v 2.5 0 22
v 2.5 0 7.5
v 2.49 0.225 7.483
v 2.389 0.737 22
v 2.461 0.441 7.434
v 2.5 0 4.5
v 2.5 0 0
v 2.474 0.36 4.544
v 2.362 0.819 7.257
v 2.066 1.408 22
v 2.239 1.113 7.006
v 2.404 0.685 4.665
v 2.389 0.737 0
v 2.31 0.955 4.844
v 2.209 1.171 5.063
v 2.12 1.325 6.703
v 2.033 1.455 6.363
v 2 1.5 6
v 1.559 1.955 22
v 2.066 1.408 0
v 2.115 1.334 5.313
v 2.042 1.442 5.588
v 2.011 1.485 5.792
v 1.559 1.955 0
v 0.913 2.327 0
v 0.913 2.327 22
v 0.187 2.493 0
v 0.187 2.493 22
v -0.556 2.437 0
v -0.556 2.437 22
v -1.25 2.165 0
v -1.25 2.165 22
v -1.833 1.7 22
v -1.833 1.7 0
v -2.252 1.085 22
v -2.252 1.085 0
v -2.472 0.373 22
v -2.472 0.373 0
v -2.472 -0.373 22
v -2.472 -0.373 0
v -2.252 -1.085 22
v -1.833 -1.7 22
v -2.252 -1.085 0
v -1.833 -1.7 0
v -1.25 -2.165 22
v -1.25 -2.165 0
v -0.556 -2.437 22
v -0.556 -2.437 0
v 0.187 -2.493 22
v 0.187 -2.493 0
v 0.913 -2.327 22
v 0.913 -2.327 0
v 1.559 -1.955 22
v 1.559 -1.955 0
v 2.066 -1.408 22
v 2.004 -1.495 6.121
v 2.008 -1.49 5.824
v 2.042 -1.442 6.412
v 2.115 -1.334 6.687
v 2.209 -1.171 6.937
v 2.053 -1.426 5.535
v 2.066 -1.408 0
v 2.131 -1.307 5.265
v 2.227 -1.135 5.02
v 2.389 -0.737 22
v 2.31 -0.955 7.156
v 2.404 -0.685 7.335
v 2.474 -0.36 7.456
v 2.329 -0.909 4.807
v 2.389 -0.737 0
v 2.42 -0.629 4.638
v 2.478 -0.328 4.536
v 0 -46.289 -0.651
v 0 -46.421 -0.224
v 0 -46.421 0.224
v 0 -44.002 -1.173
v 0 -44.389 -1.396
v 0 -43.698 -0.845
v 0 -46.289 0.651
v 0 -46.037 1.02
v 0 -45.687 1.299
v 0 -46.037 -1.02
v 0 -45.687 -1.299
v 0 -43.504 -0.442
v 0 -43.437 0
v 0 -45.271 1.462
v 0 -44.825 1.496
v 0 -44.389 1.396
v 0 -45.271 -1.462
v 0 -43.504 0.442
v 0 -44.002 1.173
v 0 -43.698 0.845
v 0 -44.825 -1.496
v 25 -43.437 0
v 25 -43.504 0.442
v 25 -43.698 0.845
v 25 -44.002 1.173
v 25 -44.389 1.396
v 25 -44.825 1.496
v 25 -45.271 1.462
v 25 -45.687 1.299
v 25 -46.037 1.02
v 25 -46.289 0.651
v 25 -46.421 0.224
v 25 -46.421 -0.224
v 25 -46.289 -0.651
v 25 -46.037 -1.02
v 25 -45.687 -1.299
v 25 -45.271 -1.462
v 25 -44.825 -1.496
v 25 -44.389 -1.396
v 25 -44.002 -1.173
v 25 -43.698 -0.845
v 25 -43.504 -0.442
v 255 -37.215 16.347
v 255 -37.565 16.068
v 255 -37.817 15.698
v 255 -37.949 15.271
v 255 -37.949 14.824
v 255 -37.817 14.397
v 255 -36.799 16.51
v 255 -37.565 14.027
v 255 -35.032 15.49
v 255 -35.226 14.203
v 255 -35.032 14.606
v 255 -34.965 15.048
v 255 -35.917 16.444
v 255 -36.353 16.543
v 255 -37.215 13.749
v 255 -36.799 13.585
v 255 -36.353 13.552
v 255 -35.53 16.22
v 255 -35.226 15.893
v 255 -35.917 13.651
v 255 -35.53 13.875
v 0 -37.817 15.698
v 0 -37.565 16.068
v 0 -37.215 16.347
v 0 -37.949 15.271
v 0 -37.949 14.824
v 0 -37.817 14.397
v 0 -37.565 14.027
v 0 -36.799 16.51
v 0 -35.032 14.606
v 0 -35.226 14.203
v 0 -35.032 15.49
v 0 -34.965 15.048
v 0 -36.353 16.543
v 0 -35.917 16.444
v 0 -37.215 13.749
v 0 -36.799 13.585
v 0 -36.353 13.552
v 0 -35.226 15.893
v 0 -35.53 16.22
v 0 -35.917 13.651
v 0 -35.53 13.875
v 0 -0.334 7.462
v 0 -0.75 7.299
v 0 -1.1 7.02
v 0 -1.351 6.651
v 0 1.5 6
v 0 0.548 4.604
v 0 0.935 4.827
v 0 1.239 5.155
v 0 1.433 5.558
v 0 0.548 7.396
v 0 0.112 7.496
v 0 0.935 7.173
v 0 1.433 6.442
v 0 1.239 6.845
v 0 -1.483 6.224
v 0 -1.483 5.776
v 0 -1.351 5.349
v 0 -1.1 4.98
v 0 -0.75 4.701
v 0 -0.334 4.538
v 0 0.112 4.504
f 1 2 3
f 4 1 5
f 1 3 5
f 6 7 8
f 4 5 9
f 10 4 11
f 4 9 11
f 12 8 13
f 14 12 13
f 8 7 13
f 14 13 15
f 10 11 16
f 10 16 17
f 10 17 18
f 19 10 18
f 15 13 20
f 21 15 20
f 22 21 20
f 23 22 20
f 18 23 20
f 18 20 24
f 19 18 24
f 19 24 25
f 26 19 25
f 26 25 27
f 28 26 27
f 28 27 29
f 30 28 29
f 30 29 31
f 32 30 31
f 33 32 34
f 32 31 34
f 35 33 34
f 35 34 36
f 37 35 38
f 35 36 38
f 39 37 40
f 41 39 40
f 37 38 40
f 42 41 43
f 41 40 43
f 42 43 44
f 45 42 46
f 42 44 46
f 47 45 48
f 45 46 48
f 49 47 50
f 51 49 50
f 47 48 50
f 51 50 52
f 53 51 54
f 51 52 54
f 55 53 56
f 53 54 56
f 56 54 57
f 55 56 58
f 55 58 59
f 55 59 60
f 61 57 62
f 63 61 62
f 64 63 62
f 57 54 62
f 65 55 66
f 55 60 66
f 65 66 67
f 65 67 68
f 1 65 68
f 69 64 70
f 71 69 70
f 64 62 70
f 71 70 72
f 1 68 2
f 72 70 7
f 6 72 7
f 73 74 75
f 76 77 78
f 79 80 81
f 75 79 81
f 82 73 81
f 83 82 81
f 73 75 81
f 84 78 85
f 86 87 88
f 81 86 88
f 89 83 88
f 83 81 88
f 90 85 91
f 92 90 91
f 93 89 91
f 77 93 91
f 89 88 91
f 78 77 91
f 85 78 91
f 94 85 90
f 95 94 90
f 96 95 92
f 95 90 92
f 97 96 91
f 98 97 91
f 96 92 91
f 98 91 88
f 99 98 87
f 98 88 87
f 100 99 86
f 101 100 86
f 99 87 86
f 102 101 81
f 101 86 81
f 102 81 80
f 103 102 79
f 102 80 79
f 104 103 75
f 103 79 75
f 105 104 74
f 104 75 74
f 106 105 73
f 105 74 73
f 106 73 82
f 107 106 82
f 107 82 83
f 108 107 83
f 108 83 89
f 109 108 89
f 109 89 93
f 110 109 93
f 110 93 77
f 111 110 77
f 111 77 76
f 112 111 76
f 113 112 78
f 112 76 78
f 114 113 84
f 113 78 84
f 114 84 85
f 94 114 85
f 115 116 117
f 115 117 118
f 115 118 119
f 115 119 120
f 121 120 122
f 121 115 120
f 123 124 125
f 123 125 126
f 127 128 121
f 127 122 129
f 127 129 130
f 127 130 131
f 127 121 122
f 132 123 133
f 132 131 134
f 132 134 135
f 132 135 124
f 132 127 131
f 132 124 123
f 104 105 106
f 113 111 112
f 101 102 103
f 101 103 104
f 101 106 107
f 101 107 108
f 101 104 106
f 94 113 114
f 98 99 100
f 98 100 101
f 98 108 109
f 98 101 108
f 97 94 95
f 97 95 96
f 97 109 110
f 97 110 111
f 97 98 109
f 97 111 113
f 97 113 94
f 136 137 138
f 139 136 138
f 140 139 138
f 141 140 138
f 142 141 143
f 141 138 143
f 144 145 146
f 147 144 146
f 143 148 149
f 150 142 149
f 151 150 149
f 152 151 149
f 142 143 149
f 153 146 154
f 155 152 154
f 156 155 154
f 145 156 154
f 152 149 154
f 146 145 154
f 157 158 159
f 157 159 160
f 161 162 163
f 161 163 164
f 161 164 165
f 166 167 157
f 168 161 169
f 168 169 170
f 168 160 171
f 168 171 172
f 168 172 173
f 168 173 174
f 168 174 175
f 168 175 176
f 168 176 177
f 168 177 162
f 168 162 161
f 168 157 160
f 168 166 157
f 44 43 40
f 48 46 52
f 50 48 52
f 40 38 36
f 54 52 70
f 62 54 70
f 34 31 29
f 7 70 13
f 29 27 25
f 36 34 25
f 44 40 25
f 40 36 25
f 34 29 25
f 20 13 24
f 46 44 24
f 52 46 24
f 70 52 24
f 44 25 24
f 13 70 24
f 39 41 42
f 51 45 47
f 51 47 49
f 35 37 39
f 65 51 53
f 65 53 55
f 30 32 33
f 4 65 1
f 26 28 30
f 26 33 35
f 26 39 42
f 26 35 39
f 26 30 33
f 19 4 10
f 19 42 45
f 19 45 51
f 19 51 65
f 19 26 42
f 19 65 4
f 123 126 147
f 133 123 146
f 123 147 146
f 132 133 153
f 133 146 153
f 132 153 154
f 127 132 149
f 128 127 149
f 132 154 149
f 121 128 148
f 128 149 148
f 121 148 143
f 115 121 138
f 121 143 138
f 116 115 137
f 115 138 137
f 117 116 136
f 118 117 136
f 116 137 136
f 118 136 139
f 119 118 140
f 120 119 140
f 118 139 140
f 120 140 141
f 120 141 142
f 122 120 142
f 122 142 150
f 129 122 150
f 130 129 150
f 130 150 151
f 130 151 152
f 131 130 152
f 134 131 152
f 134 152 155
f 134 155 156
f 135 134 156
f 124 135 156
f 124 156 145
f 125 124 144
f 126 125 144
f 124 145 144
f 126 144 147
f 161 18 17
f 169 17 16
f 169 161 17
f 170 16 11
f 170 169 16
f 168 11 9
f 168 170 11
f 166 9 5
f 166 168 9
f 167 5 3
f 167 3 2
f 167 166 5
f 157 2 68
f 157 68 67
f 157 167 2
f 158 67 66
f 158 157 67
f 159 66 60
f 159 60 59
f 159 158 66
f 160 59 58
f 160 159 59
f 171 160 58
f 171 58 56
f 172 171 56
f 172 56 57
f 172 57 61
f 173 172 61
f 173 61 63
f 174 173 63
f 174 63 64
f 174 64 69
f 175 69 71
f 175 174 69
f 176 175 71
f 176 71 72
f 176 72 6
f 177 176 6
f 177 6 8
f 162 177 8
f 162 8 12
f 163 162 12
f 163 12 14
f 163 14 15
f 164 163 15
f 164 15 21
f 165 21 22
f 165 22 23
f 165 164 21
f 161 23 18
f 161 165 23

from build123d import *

# Parameters (mm, degrees)
F0_R     = 2.5
F1_DEPTH = 22
F2_R     = 1.5
F3_DEPTH = 25
F4_R     = 1.5
F5_DEPTH = 255
F6_R     = 1.5
F7_DEPTH = 25


with BuildPart() as f1:
    # F0 (on Top) → F1 (new body)
    with BuildSketch(Plane.XY):
        Circle(F0_R)
    extrude(amount=F1_DEPTH)

    # F2 (on Right) → F3 (cut)
    with BuildSketch(Plane.YZ):
        with Locations((0, 6)):
            Circle(F2_R)
    extrude(amount=F3_DEPTH, mode=Mode.SUBTRACT)


with BuildPart() as f5:
    # F4 (on Right) → F5 (new body)
    with BuildSketch(Plane.YZ):
        with Locations((-36.465298, 15.047641)):
            Circle(F4_R)
    extrude(amount=F5_DEPTH)


with BuildPart() as f7:
    # F6 (on Right) → F7 (new body)
    with BuildSketch(Plane.YZ):
        with Locations((-44.937495, 0)):
            Circle(F6_R)
    extrude(amount=F7_DEPTH)


solid = Compound([f1.part, f5.part, f7.part])
